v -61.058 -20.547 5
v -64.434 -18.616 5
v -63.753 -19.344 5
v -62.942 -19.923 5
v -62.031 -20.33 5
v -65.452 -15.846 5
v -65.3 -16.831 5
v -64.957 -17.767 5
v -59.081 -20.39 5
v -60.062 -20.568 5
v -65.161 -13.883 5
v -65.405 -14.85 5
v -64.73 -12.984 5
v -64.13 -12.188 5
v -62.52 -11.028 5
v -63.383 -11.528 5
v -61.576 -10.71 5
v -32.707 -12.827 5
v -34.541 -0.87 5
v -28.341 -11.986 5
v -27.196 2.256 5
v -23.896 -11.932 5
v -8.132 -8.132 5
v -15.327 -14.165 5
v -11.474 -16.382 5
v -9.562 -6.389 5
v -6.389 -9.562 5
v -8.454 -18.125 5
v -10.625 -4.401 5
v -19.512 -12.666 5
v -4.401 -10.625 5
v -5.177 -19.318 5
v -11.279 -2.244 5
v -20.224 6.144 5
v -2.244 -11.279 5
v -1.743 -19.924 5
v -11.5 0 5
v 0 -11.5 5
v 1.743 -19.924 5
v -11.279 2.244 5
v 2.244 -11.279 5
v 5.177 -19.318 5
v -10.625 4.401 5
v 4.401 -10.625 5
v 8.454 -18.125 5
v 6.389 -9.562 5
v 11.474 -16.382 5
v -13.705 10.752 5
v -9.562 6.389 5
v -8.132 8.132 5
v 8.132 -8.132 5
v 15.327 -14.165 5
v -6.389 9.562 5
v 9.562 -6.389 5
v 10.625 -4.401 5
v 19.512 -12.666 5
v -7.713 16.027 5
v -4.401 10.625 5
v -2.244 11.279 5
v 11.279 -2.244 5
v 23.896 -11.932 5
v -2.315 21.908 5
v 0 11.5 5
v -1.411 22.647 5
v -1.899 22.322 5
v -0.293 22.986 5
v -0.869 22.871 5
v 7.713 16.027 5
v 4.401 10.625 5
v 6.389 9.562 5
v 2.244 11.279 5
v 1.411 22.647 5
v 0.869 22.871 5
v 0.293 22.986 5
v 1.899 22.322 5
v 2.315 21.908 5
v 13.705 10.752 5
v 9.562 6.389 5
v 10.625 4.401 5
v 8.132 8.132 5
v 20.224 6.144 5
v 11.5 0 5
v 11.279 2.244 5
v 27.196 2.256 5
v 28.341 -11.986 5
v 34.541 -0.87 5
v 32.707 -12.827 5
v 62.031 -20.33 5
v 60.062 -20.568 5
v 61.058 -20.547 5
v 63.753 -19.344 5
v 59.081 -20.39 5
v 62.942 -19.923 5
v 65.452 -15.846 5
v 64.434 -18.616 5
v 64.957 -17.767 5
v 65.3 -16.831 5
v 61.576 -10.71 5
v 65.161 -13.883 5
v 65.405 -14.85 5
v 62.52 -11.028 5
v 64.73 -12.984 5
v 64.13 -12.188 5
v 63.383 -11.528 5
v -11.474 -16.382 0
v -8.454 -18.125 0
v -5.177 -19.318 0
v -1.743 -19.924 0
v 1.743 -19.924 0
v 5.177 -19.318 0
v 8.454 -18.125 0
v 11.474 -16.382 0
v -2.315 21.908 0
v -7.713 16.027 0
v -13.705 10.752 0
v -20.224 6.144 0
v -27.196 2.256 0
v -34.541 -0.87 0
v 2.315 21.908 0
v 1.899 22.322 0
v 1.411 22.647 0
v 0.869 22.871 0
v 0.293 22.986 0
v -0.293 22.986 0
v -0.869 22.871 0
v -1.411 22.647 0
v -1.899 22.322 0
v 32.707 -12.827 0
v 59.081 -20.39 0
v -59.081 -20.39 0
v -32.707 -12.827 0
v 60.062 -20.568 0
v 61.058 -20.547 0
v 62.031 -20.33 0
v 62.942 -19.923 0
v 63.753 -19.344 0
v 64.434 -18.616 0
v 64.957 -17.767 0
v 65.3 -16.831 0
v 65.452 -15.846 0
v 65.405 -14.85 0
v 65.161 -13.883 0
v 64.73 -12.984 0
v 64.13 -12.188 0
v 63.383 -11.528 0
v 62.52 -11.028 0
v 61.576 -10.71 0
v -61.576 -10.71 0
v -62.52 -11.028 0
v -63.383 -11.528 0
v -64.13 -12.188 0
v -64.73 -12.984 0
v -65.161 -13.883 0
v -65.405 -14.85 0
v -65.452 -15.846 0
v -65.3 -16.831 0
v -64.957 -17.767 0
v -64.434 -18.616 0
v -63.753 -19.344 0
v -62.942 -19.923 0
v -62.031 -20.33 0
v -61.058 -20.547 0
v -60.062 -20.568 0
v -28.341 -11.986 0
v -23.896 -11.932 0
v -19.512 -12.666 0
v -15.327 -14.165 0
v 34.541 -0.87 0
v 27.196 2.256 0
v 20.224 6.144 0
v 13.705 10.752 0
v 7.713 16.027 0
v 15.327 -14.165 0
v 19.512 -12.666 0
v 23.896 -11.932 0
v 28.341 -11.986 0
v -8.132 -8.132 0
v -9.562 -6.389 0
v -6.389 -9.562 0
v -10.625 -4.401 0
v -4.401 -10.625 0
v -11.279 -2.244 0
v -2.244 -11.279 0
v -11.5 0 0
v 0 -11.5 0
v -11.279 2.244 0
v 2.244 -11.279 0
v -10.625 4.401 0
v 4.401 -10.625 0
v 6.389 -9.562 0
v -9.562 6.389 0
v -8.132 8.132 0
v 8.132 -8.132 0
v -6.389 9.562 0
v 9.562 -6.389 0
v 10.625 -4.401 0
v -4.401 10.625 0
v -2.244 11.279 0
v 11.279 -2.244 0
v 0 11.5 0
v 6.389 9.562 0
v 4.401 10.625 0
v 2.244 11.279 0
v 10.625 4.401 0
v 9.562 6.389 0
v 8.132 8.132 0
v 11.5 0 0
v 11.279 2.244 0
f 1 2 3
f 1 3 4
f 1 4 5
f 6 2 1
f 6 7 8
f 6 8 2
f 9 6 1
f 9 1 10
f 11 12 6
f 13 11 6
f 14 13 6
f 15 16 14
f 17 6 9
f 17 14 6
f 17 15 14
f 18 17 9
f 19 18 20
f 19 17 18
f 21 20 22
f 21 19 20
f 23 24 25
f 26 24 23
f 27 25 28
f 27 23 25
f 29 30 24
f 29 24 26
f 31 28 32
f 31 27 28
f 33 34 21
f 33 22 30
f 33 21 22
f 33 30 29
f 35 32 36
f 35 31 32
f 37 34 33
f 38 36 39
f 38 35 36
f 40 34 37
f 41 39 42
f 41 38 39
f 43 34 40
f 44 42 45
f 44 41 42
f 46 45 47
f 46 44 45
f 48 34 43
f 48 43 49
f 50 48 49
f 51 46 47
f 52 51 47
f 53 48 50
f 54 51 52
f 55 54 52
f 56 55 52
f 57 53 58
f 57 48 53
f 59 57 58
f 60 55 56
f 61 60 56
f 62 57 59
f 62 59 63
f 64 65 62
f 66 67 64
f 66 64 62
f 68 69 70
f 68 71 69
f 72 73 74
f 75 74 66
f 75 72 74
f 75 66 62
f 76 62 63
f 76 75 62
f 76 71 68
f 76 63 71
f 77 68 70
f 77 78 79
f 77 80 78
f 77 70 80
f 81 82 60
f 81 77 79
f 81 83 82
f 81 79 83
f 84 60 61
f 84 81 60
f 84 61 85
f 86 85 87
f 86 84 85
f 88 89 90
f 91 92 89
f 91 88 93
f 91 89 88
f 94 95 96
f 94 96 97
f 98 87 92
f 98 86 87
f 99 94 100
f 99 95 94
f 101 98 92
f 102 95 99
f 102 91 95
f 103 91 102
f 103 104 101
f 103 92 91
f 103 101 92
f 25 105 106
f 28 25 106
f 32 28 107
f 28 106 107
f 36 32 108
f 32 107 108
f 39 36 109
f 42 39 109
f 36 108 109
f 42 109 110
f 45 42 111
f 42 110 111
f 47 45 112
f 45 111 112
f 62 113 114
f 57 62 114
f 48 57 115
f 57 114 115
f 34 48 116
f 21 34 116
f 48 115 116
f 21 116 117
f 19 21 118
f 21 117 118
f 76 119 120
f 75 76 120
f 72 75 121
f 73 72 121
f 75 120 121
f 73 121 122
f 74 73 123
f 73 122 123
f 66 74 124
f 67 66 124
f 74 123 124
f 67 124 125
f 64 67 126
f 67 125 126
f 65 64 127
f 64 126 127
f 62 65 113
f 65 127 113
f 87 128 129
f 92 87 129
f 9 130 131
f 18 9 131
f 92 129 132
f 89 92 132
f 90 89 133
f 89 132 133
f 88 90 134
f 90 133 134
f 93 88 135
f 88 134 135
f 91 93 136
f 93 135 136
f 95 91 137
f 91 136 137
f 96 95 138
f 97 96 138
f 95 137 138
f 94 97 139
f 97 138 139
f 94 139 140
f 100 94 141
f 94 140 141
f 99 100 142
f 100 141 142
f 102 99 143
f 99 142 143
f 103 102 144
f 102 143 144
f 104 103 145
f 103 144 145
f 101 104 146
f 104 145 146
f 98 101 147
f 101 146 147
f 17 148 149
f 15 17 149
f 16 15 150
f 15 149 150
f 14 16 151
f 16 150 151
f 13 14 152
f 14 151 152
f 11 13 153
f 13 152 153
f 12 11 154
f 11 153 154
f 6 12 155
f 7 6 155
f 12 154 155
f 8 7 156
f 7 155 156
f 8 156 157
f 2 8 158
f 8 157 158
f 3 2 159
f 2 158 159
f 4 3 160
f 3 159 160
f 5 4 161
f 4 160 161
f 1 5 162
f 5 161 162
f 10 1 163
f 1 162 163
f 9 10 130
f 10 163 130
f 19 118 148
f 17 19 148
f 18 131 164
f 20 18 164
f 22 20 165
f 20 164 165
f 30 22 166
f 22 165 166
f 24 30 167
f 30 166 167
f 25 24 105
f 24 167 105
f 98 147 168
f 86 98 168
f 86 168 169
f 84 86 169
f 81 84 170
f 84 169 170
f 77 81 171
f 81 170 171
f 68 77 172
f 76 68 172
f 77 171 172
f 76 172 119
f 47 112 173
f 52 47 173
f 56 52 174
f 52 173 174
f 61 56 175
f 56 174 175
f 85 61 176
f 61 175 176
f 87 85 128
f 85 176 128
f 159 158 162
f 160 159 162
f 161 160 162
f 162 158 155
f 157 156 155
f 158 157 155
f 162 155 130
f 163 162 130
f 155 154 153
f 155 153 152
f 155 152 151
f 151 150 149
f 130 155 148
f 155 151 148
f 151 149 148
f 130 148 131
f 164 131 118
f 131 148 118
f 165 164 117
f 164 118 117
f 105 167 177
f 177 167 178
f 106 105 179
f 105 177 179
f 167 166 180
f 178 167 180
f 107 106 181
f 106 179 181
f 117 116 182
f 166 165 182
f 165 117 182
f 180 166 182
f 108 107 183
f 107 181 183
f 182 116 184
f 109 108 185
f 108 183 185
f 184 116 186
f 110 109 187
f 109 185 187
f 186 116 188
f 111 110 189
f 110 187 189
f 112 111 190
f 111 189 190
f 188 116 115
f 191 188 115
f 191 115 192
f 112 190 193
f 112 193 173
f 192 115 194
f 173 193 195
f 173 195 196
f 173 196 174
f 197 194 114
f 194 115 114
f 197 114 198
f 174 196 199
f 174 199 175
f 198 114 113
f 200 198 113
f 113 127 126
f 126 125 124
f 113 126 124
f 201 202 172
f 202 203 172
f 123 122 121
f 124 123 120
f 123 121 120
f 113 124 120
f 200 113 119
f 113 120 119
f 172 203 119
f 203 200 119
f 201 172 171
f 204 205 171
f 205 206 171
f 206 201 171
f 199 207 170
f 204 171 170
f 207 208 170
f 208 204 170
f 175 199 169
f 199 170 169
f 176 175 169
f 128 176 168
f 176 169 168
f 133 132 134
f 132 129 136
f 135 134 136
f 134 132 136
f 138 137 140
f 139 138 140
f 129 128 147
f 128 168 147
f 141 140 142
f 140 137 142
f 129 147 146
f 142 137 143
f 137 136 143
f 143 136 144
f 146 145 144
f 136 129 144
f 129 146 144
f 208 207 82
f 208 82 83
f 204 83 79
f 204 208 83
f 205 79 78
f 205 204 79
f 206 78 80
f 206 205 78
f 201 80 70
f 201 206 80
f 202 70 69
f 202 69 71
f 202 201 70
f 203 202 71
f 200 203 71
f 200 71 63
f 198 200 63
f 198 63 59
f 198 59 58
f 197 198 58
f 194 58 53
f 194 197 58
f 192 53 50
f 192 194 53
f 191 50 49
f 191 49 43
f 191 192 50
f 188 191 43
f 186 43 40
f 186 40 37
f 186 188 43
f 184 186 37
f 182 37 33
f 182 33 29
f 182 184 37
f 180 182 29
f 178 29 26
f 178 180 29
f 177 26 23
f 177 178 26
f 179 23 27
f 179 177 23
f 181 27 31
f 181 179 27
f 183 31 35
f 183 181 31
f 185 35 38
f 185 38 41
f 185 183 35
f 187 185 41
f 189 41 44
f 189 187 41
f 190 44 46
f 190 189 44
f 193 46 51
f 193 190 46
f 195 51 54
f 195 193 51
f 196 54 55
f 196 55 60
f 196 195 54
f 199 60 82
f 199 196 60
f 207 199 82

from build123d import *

# Parameters (mm, degrees)
SZKIC1_R                    = 11.5
DODANIE_WYCI_GNI_CIE1_DEPTH = 5


with BuildPart() as part:
    # Szkic1 → Dodanie-wyciągnięcie1 (new body)
    with BuildSketch(Plane.XY):
        with BuildLine():
            Line((61.575587946, -10.709667087), (34.541009179, -0.86988512))
            ThreePointArc((34.541009179, -0.86988512), (16.903048978, 8.361476253), (2.31509692, 21.907963902))
            ThreePointArc((2.31509692, 21.907963902), (0, 23), (-2.31509692, 21.907963902))
            ThreePointArc((-2.31509692, 21.907963902), (-16.903048978, 8.361476253), (-34.541009179, -0.86988512))
            Line((-34.541009179, -0.86988512), (-61.575587946, -10.709667087))
            ThreePointArc((-61.575587946, -10.709667087), (-65.300497868, -16.83130683), (-59.08055809, -20.389645799))
            Line((-59.08055809, -20.389645799), (-32.70655403, -12.827021831))
            ThreePointArc((-32.70655403, -12.827021831), (-21.687864518, -12.201686212), (-11.473608949, -16.381584102))
            ThreePointArc((-11.473608949, -16.381584102), (0, -20), (11.473608949, -16.381584102))
            ThreePointArc((11.473608949, -16.381584102), (21.687864518, -12.201686212), (32.70655403, -12.827021831))
            Line((32.70655403, -12.827021831), (59.08055809, -20.389645799))
            ThreePointArc((59.08055809, -20.389645799), (65.300497868, -16.83130683), (61.575587946, -10.709667087))
        make_face()
        Circle(SZKIC1_R, mode=Mode.SUBTRACT)
    extrude(amount=DODANIE_WYCI_GNI_CIE1_DEPTH)


solid = part.part
